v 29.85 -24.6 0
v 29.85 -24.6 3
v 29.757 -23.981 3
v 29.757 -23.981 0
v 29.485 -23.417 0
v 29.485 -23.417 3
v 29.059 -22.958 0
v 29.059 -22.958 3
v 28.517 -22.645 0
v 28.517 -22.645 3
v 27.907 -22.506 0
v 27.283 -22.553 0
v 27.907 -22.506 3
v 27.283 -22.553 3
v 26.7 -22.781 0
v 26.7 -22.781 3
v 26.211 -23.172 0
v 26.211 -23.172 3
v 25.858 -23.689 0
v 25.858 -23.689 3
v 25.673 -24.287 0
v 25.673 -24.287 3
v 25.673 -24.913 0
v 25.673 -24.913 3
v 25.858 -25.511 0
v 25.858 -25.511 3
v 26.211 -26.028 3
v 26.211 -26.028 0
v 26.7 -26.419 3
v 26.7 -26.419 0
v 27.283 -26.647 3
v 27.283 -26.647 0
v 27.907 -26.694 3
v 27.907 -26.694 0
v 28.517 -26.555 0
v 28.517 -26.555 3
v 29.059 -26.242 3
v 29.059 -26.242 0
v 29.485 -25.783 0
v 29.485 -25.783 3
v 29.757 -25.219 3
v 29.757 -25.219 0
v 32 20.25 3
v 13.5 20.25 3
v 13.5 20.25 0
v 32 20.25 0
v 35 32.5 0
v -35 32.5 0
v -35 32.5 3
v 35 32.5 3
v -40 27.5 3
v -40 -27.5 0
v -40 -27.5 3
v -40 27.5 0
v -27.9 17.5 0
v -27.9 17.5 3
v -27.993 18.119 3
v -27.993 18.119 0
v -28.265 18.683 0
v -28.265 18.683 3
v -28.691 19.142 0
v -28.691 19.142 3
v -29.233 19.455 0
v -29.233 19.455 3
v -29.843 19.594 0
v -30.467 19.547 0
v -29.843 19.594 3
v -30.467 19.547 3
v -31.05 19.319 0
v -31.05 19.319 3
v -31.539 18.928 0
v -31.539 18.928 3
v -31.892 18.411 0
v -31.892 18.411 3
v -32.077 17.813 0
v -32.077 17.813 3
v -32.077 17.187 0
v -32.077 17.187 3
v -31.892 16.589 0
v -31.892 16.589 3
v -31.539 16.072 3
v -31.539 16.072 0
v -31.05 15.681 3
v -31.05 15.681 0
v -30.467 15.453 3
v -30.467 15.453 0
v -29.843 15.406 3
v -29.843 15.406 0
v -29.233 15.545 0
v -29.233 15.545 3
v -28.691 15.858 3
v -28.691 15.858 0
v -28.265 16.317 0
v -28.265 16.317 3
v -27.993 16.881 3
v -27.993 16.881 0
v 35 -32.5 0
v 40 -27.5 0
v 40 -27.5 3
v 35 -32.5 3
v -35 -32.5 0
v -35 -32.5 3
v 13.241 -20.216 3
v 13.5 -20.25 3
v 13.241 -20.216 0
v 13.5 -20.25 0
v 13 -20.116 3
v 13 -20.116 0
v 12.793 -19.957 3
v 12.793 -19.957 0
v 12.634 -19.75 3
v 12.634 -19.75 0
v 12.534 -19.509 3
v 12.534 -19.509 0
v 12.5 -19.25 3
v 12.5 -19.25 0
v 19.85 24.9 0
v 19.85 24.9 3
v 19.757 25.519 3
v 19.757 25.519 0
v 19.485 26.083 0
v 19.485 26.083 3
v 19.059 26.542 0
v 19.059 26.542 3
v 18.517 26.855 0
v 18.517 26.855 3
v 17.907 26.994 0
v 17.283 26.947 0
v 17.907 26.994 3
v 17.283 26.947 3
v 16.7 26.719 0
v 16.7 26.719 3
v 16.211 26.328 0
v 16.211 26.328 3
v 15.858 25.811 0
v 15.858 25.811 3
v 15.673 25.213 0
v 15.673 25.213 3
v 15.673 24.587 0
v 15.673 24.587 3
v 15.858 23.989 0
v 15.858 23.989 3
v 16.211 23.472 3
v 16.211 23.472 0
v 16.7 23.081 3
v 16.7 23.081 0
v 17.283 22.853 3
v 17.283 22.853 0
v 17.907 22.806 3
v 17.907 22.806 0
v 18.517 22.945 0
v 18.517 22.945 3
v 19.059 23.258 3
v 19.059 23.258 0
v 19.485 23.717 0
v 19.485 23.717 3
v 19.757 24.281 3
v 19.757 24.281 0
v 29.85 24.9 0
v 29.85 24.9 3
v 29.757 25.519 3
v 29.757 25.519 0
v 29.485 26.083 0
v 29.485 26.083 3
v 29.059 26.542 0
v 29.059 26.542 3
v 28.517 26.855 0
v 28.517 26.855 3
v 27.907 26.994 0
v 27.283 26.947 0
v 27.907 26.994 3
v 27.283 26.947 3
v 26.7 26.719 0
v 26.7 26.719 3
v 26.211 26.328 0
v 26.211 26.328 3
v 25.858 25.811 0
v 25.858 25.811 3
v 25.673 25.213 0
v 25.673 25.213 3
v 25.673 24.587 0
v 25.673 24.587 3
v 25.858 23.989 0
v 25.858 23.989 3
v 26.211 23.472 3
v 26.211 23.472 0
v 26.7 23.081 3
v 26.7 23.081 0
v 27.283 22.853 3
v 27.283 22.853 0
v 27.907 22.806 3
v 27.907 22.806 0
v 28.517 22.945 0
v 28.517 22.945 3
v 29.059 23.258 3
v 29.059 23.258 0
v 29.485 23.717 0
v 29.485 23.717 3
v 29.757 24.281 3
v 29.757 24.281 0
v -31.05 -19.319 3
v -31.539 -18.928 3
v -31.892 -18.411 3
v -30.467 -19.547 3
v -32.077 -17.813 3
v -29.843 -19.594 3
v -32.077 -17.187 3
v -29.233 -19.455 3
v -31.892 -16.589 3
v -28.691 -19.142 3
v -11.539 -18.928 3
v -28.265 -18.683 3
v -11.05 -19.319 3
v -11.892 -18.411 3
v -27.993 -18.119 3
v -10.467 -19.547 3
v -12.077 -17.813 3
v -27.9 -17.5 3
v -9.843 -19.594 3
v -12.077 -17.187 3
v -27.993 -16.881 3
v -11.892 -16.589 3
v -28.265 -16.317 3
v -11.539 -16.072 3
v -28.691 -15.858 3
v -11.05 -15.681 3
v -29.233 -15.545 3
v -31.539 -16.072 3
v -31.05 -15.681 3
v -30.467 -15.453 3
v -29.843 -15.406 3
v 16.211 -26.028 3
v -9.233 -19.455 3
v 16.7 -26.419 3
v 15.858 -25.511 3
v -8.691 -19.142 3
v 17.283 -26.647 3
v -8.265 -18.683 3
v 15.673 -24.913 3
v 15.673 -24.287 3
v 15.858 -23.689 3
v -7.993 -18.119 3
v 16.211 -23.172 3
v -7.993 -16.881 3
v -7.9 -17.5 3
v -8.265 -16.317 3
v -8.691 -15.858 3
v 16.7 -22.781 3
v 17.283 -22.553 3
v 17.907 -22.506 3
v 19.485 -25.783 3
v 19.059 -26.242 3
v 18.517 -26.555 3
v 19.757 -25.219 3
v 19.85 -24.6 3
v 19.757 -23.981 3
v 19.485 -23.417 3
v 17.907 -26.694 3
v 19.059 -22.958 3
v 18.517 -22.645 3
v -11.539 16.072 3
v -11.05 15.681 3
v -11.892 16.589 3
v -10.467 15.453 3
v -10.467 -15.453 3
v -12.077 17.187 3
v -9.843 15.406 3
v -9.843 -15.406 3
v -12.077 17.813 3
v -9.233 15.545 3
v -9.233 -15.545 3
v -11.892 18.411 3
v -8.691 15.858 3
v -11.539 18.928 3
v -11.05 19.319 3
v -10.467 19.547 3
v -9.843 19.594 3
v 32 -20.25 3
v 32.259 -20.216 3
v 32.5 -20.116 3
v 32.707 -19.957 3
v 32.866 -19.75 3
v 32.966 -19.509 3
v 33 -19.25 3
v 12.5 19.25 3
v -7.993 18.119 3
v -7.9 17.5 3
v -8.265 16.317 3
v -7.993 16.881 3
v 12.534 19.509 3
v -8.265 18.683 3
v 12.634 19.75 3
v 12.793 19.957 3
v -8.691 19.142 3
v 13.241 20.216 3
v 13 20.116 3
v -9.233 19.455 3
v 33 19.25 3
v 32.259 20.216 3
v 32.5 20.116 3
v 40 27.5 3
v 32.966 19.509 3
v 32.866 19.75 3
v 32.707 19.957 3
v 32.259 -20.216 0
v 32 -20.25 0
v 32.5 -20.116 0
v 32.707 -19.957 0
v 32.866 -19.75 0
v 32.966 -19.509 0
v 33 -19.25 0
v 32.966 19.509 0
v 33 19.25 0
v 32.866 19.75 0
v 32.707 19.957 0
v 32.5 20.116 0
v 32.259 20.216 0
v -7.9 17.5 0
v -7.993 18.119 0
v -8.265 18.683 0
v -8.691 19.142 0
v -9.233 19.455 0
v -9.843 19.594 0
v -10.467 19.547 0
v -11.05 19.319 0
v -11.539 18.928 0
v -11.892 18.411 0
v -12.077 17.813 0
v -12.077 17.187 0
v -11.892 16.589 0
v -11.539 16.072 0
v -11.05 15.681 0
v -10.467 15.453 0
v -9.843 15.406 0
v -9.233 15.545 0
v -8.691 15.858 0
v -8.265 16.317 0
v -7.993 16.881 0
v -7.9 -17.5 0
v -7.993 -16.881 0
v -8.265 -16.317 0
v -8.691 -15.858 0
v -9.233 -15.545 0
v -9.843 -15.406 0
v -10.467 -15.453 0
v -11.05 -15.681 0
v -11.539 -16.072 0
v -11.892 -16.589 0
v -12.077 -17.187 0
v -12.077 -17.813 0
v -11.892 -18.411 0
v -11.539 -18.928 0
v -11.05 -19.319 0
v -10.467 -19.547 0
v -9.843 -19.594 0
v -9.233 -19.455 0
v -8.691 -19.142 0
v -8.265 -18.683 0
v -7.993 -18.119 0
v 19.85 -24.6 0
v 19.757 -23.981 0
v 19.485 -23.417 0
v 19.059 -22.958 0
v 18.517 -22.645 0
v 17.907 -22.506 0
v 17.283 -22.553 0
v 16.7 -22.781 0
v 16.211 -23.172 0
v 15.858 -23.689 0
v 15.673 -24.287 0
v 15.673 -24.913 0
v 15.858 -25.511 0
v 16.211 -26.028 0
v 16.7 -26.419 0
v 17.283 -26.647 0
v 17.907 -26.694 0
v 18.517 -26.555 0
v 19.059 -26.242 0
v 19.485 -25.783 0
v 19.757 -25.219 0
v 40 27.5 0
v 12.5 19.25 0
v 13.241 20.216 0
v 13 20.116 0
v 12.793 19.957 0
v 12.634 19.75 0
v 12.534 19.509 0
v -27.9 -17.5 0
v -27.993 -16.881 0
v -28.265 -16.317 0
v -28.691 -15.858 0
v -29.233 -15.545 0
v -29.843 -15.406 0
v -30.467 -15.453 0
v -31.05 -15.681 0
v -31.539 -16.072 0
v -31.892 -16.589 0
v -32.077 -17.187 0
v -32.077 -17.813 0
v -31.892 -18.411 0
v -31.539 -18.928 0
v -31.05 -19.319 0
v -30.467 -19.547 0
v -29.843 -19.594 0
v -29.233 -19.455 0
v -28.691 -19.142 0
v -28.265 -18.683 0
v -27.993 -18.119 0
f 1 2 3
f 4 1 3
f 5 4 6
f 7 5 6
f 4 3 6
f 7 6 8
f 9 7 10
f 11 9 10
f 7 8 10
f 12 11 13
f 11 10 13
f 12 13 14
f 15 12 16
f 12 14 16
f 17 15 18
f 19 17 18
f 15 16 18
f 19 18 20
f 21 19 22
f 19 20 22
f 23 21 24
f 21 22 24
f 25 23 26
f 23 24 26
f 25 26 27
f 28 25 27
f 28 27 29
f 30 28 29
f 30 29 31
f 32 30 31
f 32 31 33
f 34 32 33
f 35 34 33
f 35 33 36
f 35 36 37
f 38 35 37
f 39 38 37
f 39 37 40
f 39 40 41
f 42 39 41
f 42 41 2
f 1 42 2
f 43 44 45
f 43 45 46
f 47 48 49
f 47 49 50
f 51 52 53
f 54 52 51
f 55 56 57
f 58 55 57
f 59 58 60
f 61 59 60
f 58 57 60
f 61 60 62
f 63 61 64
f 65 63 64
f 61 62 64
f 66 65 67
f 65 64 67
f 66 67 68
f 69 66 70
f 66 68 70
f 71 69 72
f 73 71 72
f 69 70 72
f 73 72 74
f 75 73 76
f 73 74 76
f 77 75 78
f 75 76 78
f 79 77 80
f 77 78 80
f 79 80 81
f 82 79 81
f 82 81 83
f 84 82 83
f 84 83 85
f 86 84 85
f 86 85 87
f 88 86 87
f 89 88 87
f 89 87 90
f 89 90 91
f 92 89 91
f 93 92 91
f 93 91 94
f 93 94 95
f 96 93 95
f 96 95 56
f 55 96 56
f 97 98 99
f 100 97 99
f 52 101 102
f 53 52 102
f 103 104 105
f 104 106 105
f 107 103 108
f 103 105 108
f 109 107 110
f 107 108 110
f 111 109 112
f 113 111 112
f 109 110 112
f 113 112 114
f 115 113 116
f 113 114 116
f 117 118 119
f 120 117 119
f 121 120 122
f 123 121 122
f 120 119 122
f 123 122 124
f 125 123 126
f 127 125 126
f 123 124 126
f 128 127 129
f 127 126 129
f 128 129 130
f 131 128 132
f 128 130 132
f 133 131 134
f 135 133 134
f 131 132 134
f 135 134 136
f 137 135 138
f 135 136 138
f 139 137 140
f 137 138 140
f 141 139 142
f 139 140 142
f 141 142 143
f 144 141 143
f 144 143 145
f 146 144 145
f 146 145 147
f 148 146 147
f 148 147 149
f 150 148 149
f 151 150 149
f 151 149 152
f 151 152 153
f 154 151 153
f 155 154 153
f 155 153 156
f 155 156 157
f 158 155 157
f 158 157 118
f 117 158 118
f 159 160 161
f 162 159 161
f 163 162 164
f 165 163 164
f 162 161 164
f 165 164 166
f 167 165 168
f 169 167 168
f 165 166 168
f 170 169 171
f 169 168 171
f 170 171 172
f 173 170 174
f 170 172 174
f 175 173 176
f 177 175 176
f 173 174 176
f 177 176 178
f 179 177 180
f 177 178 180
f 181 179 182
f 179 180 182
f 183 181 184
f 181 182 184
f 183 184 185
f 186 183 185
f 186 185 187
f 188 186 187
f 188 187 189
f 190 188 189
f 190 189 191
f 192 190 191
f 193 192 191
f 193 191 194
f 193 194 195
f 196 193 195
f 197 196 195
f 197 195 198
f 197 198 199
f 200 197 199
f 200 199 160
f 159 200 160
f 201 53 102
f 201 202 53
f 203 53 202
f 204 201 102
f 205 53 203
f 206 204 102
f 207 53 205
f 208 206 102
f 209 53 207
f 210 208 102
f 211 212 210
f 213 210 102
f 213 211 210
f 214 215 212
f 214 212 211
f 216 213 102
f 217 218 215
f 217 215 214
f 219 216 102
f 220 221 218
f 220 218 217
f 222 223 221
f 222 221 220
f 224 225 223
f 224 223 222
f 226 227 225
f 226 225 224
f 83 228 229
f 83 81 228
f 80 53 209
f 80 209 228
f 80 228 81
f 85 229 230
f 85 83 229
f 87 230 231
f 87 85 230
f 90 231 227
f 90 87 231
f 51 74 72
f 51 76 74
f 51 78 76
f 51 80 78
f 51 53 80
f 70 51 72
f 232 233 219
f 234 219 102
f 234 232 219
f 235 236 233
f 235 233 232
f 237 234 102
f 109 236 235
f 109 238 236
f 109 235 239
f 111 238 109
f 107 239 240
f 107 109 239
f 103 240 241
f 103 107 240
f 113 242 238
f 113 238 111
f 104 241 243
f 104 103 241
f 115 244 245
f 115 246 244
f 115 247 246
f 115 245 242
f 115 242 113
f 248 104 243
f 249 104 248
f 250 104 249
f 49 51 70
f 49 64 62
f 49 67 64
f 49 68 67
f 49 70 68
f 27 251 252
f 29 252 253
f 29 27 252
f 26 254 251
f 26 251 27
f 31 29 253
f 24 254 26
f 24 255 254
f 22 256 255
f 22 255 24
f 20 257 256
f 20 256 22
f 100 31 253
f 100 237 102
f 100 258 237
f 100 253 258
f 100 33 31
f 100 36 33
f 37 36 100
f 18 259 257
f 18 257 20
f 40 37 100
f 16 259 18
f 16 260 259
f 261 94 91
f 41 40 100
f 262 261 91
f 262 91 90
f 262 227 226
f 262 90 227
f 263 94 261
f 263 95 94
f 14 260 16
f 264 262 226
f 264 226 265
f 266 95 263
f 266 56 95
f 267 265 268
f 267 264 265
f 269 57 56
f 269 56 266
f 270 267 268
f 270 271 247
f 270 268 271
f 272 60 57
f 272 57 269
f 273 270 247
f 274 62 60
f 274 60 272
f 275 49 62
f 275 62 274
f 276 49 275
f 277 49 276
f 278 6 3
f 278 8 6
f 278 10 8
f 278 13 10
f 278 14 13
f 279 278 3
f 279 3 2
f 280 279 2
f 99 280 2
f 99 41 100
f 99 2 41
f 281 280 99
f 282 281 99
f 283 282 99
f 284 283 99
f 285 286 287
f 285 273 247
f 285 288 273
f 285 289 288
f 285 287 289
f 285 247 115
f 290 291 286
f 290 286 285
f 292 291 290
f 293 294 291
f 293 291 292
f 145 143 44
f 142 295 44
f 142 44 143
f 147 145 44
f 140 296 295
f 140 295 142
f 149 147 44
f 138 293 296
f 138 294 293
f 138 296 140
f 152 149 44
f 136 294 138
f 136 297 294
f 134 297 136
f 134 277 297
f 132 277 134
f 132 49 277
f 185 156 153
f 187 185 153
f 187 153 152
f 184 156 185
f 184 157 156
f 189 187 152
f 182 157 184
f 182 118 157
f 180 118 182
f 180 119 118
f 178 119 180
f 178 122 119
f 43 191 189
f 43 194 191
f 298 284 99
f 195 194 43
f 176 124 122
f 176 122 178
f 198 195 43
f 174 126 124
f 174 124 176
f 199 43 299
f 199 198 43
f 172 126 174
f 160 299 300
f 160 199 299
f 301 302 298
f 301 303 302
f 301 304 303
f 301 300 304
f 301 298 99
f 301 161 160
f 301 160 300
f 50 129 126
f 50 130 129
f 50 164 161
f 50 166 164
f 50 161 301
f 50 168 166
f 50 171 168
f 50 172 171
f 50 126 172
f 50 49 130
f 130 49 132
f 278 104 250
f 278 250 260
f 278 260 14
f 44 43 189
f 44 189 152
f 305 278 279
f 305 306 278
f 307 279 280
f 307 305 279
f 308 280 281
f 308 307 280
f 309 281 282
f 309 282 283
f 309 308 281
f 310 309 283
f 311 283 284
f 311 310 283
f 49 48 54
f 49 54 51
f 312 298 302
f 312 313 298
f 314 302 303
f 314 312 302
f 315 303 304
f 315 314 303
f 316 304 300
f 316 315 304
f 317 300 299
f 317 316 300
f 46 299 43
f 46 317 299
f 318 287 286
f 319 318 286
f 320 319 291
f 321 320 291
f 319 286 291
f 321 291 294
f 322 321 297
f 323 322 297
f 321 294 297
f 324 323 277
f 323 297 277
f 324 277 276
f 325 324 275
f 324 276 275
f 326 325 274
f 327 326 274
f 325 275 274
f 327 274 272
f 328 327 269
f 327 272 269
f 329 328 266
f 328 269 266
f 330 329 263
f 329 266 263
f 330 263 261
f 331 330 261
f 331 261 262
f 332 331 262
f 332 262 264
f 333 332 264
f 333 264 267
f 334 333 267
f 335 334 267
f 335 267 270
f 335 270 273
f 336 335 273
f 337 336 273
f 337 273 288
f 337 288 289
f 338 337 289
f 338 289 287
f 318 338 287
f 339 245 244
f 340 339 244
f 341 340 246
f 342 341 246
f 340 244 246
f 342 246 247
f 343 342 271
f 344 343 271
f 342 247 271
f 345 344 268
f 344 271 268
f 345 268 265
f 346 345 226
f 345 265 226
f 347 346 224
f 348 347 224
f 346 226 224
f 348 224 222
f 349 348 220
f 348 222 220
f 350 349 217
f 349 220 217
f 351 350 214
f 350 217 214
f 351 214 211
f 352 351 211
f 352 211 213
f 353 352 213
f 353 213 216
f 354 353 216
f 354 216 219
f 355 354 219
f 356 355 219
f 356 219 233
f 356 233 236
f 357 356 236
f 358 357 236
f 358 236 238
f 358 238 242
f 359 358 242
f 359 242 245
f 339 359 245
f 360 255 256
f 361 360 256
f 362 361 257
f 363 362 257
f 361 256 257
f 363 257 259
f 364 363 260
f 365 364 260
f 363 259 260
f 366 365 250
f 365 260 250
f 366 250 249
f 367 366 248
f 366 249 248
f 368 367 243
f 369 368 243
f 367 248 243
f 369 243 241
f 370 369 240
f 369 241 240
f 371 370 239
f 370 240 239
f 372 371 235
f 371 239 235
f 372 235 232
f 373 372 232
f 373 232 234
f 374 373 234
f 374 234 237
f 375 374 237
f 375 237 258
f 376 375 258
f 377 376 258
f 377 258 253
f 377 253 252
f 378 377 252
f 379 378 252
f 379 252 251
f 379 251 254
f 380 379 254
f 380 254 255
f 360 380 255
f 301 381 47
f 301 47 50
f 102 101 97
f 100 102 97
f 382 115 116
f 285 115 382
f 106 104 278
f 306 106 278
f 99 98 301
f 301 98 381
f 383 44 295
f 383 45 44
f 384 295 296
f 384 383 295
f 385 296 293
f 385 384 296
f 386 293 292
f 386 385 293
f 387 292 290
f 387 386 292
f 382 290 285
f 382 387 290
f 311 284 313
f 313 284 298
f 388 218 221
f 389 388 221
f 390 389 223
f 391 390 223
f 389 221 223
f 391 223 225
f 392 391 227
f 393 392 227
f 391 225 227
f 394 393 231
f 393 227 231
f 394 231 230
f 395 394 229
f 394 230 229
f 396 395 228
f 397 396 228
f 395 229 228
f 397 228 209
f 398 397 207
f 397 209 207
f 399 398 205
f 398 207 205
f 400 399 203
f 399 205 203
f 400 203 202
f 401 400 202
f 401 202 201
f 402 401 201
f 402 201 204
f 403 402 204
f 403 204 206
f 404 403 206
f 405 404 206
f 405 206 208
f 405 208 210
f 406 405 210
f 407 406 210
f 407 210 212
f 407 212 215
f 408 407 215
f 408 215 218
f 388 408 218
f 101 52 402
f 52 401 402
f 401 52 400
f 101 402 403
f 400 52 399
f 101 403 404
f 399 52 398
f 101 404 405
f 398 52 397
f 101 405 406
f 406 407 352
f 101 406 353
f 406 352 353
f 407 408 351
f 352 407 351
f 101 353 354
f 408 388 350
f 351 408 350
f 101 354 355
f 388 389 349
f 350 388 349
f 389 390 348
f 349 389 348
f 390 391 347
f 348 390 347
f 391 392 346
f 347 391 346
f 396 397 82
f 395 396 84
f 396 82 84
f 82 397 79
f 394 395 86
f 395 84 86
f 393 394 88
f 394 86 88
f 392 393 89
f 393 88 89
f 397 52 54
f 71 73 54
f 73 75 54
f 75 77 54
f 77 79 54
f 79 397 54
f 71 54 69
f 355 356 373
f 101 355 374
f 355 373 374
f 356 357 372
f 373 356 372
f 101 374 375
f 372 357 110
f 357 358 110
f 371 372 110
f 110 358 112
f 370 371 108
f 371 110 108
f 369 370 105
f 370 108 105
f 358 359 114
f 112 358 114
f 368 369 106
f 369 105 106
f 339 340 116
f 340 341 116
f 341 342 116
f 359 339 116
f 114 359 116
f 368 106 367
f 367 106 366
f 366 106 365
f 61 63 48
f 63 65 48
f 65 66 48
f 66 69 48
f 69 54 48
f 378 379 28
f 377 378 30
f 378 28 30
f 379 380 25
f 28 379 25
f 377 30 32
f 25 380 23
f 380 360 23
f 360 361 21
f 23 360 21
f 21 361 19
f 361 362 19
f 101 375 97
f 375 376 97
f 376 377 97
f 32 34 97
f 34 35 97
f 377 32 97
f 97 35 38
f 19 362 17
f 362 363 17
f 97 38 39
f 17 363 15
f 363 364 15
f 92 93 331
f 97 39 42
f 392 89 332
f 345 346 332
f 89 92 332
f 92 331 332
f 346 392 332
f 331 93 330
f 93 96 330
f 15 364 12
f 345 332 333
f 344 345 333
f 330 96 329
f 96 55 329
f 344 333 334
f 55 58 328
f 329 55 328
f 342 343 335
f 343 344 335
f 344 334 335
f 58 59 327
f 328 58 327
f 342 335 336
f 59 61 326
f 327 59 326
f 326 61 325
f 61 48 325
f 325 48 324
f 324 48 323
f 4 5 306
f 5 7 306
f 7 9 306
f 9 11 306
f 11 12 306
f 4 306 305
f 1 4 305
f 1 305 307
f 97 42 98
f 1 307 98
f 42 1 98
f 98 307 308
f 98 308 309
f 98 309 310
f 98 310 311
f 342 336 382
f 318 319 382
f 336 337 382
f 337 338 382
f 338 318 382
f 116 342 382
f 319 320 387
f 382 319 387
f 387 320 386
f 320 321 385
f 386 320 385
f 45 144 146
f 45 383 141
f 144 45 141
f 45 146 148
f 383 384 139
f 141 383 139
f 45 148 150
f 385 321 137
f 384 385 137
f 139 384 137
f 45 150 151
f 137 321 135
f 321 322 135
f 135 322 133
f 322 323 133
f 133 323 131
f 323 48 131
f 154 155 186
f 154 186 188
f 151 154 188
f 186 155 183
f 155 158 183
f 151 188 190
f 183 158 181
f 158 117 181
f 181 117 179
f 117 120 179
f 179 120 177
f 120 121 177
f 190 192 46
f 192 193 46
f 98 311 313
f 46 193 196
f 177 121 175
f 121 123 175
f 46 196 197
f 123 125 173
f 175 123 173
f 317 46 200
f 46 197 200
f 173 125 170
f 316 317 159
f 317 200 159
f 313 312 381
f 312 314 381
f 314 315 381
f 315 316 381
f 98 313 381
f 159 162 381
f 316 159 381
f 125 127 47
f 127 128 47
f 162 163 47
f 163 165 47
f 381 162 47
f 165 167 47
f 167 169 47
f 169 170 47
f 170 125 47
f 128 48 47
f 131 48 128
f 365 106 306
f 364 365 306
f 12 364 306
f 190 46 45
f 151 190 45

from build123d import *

# Parameters (mm, degrees)
SKETCH_1_W                  = 80
SKETCH_1_H                  = 65
EXTRUDE_1_DEPTH             = 3
SKETCH_2_R                  = 2.1
CUT_EXTRUDE_1_DEPTH         = 52.626059311
PATTERN_LINEAR_1_COUNT      = 2
PATTERN_LINEAR_1_PITCH      = 20
PATTERN_LINEAR_1_COUNT_DIR2 = 2
PATTERN_LINEAR_1_PITCH_DIR2 = 35
SKETCH_4_W                  = 20.5
SKETCH_4_H                  = 40.5
CUT_EXTRUDE_2_DEPTH         = 3
FILLET_1_R                  = 1
CUT_EXTRUDE_3_REACH         = 53.626
SKETCH_5_R                  = 2.1
CHAMFER_3_SIZE              = 5


with BuildPart() as part:
    # 草圖1 → 填料-伸長1 (new body)
    with BuildSketch(Plane.XY):
        Rectangle(SKETCH_1_W, SKETCH_1_H)
    extrude(amount=EXTRUDE_1_DEPTH)

    # 草圖2 → 除料-伸長1 (cut, through all)
    with BuildSketch(Plane.XY.offset(3)):
        with Locations((-30, 17.5)):
            Circle(SKETCH_2_R)
    cut_extrude_1 = extrude(amount=-CUT_EXTRUDE_1_DEPTH, mode=Mode.SUBTRACT)

    # 直線複製排列1: Cut-Extrude 1 2 × 2
    with Locations(*[(i * PATTERN_LINEAR_1_PITCH, -j * PATTERN_LINEAR_1_PITCH_DIR2, 0) for i in range(PATTERN_LINEAR_1_COUNT) for j in range(PATTERN_LINEAR_1_COUNT_DIR2) if (i, j) != (0, 0)]):
        add(cut_extrude_1, mode=Mode.SUBTRACT)

    # 草圖4 → 除料-伸長2 (cut)
    with BuildSketch(Plane.XY.offset(3)):
        with Locations((22.75, 0)):
            Rectangle(SKETCH_4_W, SKETCH_4_H)
    extrude(amount=-CUT_EXTRUDE_2_DEPTH, mode=Mode.SUBTRACT)

    # 圓角1
    fillet_1_edges = [part.edges().sort_by_distance(p)[0] for p in [
        (33, 20.25, 1.5),
        (33, -20.25, 1.5),
        (12.5, -20.25, 1.5),
        (12.5, 20.25, 1.5),
    ]]
    fillet(fillet_1_edges, radius=FILLET_1_R)

    # 草圖5 → 除料-伸長3 (cut, up to next)
    with BuildSketch(Plane.XY.offset(3), mode=Mode.PRIVATE) as cut_extrude_3_sk1:
        with Locations((17.75, 24.9)):
            Circle(SKETCH_5_R)
    cut_extrude_3_tool1 = extrude(cut_extrude_3_sk1.sketch, amount=-CUT_EXTRUDE_3_REACH, mode=Mode.PRIVATE) & part.part
    # 草圖5 → 除料-伸長3 (cut, up to next)
    with BuildSketch(Plane.XY.offset(3), mode=Mode.PRIVATE) as cut_extrude_3_sk2:
        with Locations((27.75, 24.9)):
            Circle(SKETCH_5_R)
    cut_extrude_3_tool2 = extrude(cut_extrude_3_sk2.sketch, amount=-CUT_EXTRUDE_3_REACH, mode=Mode.PRIVATE) & part.part
    # 草圖5 → 除料-伸長3 (cut, up to next)
    with BuildSketch(Plane.XY.offset(3), mode=Mode.PRIVATE) as cut_extrude_3_sk3:
        with Locations((27.75, -24.6)):
            Circle(SKETCH_5_R)
    cut_extrude_3_tool3 = extrude(cut_extrude_3_sk3.sketch, amount=-CUT_EXTRUDE_3_REACH, mode=Mode.PRIVATE) & part.part
    # 草圖5 → 除料-伸長3 (cut, up to next)
    with BuildSketch(Plane.XY.offset(3), mode=Mode.PRIVATE) as cut_extrude_3_sk4:
        with Locations((17.75, -24.6)):
            Circle(SKETCH_5_R)
    cut_extrude_3_tool4 = extrude(cut_extrude_3_sk4.sketch, amount=-CUT_EXTRUDE_3_REACH, mode=Mode.PRIVATE) & part.part
    add(cut_extrude_3_tool1.solids().sort_by_distance((17.75, 24.9, 3))[0], mode=Mode.SUBTRACT)
    add(cut_extrude_3_tool2.solids().sort_by_distance((27.75, 24.9, 3))[0], mode=Mode.SUBTRACT)
    add(cut_extrude_3_tool3.solids().sort_by_distance((27.75, -24.6, 3))[0], mode=Mode.SUBTRACT)
    add(cut_extrude_3_tool4.solids().sort_by_distance((17.75, -24.6, 3))[0], mode=Mode.SUBTRACT)

    # 導角3
    chamfer_3_edges = [part.edges().sort_by_distance(p)[0] for p in [
        (-40, 32.5, 1.5),
        (40, 32.5, 1.5),
        (40, -32.5, 1.5),
        (-40, -32.5, 1.5),
    ]]
    chamfer(chamfer_3_edges, length=CHAMFER_3_SIZE)


solid = part.part
